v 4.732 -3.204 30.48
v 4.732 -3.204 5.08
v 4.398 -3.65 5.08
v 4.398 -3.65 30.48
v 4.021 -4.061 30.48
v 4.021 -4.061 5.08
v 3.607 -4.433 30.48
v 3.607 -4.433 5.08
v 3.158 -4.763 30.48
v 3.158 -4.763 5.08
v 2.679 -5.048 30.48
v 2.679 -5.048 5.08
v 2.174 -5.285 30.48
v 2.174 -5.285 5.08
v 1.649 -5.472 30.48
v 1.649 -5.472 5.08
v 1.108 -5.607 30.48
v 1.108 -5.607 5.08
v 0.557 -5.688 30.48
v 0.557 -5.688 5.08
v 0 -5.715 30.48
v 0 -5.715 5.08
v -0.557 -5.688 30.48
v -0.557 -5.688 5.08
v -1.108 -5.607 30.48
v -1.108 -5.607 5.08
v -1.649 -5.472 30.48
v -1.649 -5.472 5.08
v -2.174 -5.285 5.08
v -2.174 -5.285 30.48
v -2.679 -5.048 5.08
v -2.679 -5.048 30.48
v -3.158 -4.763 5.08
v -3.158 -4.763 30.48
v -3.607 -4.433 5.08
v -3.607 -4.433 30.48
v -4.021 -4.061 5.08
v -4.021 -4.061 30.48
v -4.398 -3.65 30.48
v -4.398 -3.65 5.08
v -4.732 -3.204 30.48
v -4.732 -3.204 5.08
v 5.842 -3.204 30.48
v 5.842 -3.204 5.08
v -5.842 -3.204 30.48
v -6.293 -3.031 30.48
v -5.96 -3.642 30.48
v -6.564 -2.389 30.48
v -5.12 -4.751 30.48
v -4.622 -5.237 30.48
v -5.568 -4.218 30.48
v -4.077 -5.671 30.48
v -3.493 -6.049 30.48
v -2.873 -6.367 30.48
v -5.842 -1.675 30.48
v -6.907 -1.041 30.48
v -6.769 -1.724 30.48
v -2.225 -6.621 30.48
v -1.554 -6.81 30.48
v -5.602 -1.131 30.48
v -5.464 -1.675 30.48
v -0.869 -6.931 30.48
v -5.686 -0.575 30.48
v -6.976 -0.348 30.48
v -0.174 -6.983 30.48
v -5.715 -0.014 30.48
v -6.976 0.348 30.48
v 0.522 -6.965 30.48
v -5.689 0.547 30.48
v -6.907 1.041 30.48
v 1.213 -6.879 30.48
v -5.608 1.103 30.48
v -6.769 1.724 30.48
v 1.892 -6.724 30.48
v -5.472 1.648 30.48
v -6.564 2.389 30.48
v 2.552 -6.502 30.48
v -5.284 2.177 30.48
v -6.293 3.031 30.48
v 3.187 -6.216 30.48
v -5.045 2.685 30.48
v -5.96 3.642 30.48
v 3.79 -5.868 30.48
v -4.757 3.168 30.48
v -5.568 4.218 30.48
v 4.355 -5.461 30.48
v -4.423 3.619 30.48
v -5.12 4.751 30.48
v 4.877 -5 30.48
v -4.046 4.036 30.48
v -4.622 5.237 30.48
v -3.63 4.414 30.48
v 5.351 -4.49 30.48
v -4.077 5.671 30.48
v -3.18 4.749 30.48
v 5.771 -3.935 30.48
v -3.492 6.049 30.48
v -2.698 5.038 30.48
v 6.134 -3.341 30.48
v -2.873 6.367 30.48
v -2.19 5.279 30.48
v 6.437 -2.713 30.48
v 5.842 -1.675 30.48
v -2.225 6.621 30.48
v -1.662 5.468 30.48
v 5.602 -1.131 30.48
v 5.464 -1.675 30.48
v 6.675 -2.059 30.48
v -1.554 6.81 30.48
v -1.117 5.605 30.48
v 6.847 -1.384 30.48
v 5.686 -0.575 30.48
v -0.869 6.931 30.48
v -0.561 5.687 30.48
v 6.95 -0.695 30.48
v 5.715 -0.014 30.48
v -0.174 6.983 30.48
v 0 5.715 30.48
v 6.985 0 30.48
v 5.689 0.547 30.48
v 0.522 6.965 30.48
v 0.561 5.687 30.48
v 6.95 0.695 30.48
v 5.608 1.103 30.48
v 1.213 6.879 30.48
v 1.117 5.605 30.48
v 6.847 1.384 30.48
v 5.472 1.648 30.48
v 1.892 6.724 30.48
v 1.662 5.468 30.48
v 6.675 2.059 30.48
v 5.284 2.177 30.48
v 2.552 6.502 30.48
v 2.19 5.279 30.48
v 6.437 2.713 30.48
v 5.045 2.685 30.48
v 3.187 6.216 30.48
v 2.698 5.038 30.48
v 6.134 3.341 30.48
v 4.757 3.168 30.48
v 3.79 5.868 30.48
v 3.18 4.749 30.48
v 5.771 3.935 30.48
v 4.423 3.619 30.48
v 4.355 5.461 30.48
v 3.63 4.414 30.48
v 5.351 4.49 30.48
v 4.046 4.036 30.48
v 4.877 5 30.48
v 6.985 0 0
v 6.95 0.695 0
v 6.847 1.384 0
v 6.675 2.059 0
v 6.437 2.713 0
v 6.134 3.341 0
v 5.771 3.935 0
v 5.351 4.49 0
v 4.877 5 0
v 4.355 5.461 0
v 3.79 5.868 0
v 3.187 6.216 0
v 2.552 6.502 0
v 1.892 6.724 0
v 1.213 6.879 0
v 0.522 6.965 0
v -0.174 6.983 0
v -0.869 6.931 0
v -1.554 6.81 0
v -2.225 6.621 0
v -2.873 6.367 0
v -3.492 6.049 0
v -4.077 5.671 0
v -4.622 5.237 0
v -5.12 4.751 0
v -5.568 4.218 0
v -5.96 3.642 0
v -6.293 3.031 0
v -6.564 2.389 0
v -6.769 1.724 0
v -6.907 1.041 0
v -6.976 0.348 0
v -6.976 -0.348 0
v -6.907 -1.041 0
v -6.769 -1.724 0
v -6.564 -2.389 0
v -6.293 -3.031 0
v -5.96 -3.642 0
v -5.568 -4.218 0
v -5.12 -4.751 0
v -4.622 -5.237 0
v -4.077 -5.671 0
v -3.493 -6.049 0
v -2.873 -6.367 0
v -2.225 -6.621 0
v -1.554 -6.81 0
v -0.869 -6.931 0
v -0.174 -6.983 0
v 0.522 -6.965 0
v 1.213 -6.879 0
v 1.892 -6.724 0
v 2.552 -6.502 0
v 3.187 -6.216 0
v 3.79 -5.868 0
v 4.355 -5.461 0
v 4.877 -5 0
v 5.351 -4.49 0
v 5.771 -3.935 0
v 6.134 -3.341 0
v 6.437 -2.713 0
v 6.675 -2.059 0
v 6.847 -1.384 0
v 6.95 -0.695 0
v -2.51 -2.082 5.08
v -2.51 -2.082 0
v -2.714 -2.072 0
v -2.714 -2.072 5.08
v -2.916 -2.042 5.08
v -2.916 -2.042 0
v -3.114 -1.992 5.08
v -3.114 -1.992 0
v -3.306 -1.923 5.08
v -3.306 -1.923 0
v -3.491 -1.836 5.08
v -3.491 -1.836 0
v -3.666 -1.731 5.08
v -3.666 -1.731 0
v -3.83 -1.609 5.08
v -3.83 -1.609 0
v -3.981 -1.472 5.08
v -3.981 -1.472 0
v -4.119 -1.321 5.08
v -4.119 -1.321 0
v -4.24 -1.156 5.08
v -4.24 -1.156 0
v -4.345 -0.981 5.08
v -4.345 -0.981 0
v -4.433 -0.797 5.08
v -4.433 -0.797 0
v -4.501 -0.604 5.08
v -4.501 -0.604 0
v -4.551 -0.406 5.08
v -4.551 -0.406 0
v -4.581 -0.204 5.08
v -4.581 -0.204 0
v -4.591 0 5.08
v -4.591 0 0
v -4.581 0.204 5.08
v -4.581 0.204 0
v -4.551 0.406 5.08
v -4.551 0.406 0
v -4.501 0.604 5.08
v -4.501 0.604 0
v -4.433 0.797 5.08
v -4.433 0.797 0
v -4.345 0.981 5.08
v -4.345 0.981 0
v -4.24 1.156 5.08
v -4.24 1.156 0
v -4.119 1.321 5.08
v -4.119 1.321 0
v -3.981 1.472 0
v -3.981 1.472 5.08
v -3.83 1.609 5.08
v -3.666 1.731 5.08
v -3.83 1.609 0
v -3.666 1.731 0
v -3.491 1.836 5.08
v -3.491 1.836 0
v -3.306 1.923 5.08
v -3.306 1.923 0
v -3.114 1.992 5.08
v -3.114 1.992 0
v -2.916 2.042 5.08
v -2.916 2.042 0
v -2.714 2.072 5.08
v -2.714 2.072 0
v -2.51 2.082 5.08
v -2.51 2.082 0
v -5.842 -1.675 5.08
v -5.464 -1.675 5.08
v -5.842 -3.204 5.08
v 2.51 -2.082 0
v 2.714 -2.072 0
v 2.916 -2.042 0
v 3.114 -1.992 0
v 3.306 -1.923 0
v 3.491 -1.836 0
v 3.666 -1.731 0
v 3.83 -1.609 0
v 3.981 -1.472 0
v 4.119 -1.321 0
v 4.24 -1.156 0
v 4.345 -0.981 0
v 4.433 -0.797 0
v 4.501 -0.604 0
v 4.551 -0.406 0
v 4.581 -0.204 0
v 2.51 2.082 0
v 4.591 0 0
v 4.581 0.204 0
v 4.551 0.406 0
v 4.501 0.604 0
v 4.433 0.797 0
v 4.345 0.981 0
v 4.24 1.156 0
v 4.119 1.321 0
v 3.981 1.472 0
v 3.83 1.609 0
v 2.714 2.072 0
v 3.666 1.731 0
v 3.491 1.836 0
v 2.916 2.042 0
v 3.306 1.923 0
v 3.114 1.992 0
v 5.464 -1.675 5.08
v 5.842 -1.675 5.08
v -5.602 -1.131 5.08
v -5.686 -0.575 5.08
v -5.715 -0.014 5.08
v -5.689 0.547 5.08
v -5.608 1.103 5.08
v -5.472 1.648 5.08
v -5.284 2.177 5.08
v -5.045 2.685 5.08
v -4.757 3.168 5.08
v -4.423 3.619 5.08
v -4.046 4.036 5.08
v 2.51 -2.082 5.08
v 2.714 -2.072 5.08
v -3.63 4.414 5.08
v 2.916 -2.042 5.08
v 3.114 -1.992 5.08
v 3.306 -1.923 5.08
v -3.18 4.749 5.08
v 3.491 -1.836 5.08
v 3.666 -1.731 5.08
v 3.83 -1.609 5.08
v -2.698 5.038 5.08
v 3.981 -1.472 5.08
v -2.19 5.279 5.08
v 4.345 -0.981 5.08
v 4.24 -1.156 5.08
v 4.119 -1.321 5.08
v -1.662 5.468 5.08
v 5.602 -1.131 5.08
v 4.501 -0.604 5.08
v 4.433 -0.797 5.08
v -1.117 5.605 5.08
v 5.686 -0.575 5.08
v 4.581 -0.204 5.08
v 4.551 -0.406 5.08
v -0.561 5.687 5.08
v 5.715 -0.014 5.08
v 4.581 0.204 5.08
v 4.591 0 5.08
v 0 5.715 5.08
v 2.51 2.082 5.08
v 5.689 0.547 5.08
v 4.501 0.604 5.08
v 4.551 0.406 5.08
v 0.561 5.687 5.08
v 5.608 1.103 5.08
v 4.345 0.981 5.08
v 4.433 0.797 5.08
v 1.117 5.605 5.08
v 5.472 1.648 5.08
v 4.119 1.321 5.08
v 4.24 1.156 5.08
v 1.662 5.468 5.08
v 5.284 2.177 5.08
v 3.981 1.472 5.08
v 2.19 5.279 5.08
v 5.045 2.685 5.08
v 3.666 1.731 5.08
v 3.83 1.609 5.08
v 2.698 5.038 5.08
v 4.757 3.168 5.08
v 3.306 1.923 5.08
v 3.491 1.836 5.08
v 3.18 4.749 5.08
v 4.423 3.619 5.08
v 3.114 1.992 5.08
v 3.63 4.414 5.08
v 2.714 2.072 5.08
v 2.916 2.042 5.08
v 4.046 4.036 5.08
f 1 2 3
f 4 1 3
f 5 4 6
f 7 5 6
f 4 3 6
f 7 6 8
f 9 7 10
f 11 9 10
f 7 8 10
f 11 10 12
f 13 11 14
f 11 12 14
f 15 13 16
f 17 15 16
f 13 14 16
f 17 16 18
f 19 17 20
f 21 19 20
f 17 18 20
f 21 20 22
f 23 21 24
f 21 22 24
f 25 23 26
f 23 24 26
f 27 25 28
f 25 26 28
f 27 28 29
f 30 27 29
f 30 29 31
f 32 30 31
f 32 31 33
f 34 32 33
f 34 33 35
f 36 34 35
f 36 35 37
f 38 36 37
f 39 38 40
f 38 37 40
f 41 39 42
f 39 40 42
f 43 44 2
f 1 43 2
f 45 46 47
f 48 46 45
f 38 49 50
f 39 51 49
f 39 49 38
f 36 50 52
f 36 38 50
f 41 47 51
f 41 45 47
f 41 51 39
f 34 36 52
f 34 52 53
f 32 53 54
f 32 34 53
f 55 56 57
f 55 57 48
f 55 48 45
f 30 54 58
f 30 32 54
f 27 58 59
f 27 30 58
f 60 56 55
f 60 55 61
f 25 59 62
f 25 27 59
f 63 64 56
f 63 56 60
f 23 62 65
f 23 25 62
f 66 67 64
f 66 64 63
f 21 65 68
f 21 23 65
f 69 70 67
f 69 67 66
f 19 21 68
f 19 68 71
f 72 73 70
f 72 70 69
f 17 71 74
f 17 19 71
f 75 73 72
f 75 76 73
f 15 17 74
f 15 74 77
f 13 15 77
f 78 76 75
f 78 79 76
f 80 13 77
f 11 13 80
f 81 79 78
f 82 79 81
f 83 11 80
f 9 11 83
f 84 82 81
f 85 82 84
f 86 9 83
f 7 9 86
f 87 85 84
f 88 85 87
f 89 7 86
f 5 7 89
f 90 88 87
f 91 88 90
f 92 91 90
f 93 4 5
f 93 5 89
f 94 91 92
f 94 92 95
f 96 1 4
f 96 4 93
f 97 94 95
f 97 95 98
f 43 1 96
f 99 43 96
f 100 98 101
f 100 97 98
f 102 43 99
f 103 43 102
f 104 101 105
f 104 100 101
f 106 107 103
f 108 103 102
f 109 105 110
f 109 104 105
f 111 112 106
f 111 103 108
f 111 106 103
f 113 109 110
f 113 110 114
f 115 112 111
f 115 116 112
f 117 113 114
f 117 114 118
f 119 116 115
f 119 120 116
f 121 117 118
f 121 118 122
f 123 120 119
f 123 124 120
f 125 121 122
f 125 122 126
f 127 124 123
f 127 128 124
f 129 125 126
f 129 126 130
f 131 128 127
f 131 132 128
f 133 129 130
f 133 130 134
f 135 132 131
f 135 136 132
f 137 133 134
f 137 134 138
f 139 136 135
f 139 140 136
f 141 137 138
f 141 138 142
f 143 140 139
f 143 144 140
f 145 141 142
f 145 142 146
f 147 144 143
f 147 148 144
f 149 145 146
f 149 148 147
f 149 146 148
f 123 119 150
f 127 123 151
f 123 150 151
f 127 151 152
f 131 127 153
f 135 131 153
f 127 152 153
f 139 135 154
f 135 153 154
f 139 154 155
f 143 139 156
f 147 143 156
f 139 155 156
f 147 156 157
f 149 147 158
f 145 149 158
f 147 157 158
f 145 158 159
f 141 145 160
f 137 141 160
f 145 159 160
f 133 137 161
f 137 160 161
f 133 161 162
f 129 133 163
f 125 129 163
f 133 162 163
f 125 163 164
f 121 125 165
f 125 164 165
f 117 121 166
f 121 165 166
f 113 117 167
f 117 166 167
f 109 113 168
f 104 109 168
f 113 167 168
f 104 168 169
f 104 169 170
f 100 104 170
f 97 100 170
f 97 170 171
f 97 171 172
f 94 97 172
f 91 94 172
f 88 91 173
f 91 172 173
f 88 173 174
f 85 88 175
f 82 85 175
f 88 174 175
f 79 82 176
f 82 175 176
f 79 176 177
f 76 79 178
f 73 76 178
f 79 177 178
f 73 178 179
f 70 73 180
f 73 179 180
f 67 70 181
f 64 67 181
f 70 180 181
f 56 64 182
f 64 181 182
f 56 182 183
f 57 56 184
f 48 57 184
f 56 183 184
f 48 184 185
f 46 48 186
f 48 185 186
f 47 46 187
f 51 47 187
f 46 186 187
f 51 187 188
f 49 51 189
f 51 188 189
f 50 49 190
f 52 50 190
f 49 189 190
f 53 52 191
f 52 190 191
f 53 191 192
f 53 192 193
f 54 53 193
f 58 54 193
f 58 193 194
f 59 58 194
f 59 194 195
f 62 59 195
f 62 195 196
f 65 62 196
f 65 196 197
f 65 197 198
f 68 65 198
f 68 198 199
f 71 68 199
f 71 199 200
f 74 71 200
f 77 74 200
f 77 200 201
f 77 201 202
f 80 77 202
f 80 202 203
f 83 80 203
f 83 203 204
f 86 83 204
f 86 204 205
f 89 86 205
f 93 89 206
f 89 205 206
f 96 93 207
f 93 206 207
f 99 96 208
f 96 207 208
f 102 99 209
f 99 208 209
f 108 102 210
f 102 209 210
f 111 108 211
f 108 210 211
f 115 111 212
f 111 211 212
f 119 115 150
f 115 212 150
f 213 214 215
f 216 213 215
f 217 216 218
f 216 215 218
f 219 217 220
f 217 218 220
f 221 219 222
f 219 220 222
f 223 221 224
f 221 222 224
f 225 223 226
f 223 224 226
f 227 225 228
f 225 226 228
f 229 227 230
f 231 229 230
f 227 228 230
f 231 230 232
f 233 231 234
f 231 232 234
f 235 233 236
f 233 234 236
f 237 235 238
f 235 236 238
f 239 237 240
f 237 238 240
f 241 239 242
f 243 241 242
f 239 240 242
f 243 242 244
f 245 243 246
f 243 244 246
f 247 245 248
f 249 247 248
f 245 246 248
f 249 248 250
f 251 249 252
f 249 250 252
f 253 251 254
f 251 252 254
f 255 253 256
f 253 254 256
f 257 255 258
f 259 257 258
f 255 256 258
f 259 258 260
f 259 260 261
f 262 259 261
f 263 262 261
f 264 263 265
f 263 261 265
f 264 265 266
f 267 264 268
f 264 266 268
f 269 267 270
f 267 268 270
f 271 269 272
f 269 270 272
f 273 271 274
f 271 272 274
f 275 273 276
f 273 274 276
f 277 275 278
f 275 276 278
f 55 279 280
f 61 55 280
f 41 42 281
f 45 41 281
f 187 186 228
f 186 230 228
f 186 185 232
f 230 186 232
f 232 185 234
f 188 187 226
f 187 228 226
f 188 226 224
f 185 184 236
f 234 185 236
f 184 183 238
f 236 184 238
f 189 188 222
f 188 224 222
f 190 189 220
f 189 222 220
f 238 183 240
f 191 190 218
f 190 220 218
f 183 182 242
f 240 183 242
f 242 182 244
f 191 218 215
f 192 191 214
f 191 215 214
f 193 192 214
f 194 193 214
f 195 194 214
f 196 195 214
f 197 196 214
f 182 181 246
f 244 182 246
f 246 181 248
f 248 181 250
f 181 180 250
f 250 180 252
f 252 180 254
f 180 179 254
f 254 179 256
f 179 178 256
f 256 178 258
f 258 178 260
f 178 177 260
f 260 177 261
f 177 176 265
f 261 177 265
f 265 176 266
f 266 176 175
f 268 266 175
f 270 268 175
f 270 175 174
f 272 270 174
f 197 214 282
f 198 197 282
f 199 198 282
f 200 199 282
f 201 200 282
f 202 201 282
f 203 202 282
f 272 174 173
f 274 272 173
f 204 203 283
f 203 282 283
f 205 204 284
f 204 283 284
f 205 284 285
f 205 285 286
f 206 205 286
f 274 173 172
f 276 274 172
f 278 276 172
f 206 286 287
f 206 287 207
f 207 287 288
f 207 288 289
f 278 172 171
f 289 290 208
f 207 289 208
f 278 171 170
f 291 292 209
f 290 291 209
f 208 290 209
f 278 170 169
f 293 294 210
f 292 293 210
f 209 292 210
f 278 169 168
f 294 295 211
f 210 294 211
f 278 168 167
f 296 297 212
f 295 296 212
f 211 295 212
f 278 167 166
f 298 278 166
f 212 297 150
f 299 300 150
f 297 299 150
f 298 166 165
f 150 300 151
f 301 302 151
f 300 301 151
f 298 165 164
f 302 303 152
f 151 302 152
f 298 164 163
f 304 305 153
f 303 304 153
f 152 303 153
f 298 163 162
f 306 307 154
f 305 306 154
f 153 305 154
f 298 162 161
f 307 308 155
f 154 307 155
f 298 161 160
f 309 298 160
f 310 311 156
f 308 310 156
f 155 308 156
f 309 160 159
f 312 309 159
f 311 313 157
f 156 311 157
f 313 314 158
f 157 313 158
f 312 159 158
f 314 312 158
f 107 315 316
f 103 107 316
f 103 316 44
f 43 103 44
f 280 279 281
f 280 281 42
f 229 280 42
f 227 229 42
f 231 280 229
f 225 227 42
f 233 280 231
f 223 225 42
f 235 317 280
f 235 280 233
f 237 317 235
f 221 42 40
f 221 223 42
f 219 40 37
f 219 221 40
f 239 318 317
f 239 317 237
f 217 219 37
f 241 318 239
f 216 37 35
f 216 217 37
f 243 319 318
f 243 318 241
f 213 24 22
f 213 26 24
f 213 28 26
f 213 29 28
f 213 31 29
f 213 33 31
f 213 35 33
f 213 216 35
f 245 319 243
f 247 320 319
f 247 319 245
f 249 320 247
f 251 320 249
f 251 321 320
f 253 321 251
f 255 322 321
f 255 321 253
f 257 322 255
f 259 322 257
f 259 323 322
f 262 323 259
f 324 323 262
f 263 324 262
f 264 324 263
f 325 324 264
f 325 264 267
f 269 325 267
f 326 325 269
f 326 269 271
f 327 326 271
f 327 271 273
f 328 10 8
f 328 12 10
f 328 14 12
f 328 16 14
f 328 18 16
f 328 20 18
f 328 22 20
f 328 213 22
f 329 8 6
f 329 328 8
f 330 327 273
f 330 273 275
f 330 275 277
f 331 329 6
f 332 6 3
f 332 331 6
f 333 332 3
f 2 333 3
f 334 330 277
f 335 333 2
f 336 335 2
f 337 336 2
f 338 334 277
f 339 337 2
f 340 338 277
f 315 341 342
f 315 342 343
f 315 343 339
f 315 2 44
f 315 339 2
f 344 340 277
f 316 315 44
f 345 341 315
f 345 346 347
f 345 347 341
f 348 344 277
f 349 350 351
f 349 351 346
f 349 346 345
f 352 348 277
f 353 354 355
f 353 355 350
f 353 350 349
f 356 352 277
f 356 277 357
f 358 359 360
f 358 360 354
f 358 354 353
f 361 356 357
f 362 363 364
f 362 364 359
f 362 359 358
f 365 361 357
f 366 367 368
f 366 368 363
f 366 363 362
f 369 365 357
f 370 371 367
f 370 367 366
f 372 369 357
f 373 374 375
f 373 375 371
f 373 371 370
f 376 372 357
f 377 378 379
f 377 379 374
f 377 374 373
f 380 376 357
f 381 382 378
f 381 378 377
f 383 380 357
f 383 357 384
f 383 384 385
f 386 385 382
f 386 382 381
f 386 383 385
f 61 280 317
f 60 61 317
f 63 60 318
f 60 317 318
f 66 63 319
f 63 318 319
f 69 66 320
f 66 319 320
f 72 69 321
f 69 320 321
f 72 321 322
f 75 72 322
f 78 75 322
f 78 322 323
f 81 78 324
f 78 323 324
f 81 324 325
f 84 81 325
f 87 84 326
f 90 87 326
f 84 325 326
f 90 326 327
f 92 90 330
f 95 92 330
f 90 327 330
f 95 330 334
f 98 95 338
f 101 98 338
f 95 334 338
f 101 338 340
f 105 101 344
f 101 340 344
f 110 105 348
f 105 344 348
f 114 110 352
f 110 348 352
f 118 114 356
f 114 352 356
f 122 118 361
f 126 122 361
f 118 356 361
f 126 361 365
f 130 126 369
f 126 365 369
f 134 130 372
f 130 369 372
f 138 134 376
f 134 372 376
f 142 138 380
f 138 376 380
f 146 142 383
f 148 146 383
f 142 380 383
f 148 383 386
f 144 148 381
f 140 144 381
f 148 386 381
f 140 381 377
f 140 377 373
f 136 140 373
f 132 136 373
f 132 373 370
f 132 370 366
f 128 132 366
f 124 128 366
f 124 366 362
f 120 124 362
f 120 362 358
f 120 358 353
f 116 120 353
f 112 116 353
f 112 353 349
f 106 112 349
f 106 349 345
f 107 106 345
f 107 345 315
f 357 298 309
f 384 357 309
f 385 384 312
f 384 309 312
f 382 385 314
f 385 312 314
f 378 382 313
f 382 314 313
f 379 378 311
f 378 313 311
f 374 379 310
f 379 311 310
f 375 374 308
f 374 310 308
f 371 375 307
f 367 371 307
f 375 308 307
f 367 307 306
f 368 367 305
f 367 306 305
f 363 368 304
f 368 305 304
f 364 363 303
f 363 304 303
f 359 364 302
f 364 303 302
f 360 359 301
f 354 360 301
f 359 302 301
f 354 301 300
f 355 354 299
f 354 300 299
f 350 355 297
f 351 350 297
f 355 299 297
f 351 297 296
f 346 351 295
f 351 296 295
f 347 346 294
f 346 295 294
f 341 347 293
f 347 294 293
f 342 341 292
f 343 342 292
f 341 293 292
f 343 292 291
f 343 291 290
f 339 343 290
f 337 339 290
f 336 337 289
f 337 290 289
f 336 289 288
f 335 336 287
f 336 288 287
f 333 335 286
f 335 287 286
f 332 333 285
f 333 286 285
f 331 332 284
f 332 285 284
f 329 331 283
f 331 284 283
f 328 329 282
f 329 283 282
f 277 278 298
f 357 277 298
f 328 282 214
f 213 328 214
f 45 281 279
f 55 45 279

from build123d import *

# Parameters (mm, degrees)
F0_R     = 6.985
F1_DEPTH = 5.08
F2_R     = 6.985
F3_DEPTH = 25.4


with BuildPart() as f1:
    # F0 (on Top) → F1 (new body)
    with BuildSketch(Plane.XY):
        Circle(F0_R)
        with BuildLine():
            ThreePointArc((-2.50952, -2.08153), (-4.59105, 0), (-2.50952, 2.08153))
            Line((-2.50952, 2.08153), (2.50952, 2.08153))
            ThreePointArc((2.50952, 2.08153), (4.59105, 0), (2.50952, -2.08153))
            Line((2.50952, -2.08153), (-2.50952, -2.08153))
        make_face(mode=Mode.SUBTRACT)
    extrude(amount=F1_DEPTH)

    # F2 (on face) → F3 (join)
    with BuildSketch(Plane.XY.offset(5.08)):
        Circle(F2_R)
        with BuildLine():
            ThreePointArc((-5.463988, -1.67513), (0, 5.715), (5.463988, -1.67513))
            Line((5.463988, -1.67513), (5.842, -1.67513))
            Line((5.842, -1.67513), (5.842, -3.204126))
            Line((5.842, -3.204126), (4.732315, -3.204126))
            ThreePointArc((4.732315, -3.204126), (0, -5.715), (-4.732315, -3.204126))
            Line((-4.732315, -3.204126), (-5.842, -3.204126))
            Line((-5.842, -3.204126), (-5.842, -1.67513))
            Line((-5.842, -1.67513), (-5.463988, -1.67513))
        make_face(mode=Mode.SUBTRACT)
    extrude(amount=F3_DEPTH)


solid = f1.part
